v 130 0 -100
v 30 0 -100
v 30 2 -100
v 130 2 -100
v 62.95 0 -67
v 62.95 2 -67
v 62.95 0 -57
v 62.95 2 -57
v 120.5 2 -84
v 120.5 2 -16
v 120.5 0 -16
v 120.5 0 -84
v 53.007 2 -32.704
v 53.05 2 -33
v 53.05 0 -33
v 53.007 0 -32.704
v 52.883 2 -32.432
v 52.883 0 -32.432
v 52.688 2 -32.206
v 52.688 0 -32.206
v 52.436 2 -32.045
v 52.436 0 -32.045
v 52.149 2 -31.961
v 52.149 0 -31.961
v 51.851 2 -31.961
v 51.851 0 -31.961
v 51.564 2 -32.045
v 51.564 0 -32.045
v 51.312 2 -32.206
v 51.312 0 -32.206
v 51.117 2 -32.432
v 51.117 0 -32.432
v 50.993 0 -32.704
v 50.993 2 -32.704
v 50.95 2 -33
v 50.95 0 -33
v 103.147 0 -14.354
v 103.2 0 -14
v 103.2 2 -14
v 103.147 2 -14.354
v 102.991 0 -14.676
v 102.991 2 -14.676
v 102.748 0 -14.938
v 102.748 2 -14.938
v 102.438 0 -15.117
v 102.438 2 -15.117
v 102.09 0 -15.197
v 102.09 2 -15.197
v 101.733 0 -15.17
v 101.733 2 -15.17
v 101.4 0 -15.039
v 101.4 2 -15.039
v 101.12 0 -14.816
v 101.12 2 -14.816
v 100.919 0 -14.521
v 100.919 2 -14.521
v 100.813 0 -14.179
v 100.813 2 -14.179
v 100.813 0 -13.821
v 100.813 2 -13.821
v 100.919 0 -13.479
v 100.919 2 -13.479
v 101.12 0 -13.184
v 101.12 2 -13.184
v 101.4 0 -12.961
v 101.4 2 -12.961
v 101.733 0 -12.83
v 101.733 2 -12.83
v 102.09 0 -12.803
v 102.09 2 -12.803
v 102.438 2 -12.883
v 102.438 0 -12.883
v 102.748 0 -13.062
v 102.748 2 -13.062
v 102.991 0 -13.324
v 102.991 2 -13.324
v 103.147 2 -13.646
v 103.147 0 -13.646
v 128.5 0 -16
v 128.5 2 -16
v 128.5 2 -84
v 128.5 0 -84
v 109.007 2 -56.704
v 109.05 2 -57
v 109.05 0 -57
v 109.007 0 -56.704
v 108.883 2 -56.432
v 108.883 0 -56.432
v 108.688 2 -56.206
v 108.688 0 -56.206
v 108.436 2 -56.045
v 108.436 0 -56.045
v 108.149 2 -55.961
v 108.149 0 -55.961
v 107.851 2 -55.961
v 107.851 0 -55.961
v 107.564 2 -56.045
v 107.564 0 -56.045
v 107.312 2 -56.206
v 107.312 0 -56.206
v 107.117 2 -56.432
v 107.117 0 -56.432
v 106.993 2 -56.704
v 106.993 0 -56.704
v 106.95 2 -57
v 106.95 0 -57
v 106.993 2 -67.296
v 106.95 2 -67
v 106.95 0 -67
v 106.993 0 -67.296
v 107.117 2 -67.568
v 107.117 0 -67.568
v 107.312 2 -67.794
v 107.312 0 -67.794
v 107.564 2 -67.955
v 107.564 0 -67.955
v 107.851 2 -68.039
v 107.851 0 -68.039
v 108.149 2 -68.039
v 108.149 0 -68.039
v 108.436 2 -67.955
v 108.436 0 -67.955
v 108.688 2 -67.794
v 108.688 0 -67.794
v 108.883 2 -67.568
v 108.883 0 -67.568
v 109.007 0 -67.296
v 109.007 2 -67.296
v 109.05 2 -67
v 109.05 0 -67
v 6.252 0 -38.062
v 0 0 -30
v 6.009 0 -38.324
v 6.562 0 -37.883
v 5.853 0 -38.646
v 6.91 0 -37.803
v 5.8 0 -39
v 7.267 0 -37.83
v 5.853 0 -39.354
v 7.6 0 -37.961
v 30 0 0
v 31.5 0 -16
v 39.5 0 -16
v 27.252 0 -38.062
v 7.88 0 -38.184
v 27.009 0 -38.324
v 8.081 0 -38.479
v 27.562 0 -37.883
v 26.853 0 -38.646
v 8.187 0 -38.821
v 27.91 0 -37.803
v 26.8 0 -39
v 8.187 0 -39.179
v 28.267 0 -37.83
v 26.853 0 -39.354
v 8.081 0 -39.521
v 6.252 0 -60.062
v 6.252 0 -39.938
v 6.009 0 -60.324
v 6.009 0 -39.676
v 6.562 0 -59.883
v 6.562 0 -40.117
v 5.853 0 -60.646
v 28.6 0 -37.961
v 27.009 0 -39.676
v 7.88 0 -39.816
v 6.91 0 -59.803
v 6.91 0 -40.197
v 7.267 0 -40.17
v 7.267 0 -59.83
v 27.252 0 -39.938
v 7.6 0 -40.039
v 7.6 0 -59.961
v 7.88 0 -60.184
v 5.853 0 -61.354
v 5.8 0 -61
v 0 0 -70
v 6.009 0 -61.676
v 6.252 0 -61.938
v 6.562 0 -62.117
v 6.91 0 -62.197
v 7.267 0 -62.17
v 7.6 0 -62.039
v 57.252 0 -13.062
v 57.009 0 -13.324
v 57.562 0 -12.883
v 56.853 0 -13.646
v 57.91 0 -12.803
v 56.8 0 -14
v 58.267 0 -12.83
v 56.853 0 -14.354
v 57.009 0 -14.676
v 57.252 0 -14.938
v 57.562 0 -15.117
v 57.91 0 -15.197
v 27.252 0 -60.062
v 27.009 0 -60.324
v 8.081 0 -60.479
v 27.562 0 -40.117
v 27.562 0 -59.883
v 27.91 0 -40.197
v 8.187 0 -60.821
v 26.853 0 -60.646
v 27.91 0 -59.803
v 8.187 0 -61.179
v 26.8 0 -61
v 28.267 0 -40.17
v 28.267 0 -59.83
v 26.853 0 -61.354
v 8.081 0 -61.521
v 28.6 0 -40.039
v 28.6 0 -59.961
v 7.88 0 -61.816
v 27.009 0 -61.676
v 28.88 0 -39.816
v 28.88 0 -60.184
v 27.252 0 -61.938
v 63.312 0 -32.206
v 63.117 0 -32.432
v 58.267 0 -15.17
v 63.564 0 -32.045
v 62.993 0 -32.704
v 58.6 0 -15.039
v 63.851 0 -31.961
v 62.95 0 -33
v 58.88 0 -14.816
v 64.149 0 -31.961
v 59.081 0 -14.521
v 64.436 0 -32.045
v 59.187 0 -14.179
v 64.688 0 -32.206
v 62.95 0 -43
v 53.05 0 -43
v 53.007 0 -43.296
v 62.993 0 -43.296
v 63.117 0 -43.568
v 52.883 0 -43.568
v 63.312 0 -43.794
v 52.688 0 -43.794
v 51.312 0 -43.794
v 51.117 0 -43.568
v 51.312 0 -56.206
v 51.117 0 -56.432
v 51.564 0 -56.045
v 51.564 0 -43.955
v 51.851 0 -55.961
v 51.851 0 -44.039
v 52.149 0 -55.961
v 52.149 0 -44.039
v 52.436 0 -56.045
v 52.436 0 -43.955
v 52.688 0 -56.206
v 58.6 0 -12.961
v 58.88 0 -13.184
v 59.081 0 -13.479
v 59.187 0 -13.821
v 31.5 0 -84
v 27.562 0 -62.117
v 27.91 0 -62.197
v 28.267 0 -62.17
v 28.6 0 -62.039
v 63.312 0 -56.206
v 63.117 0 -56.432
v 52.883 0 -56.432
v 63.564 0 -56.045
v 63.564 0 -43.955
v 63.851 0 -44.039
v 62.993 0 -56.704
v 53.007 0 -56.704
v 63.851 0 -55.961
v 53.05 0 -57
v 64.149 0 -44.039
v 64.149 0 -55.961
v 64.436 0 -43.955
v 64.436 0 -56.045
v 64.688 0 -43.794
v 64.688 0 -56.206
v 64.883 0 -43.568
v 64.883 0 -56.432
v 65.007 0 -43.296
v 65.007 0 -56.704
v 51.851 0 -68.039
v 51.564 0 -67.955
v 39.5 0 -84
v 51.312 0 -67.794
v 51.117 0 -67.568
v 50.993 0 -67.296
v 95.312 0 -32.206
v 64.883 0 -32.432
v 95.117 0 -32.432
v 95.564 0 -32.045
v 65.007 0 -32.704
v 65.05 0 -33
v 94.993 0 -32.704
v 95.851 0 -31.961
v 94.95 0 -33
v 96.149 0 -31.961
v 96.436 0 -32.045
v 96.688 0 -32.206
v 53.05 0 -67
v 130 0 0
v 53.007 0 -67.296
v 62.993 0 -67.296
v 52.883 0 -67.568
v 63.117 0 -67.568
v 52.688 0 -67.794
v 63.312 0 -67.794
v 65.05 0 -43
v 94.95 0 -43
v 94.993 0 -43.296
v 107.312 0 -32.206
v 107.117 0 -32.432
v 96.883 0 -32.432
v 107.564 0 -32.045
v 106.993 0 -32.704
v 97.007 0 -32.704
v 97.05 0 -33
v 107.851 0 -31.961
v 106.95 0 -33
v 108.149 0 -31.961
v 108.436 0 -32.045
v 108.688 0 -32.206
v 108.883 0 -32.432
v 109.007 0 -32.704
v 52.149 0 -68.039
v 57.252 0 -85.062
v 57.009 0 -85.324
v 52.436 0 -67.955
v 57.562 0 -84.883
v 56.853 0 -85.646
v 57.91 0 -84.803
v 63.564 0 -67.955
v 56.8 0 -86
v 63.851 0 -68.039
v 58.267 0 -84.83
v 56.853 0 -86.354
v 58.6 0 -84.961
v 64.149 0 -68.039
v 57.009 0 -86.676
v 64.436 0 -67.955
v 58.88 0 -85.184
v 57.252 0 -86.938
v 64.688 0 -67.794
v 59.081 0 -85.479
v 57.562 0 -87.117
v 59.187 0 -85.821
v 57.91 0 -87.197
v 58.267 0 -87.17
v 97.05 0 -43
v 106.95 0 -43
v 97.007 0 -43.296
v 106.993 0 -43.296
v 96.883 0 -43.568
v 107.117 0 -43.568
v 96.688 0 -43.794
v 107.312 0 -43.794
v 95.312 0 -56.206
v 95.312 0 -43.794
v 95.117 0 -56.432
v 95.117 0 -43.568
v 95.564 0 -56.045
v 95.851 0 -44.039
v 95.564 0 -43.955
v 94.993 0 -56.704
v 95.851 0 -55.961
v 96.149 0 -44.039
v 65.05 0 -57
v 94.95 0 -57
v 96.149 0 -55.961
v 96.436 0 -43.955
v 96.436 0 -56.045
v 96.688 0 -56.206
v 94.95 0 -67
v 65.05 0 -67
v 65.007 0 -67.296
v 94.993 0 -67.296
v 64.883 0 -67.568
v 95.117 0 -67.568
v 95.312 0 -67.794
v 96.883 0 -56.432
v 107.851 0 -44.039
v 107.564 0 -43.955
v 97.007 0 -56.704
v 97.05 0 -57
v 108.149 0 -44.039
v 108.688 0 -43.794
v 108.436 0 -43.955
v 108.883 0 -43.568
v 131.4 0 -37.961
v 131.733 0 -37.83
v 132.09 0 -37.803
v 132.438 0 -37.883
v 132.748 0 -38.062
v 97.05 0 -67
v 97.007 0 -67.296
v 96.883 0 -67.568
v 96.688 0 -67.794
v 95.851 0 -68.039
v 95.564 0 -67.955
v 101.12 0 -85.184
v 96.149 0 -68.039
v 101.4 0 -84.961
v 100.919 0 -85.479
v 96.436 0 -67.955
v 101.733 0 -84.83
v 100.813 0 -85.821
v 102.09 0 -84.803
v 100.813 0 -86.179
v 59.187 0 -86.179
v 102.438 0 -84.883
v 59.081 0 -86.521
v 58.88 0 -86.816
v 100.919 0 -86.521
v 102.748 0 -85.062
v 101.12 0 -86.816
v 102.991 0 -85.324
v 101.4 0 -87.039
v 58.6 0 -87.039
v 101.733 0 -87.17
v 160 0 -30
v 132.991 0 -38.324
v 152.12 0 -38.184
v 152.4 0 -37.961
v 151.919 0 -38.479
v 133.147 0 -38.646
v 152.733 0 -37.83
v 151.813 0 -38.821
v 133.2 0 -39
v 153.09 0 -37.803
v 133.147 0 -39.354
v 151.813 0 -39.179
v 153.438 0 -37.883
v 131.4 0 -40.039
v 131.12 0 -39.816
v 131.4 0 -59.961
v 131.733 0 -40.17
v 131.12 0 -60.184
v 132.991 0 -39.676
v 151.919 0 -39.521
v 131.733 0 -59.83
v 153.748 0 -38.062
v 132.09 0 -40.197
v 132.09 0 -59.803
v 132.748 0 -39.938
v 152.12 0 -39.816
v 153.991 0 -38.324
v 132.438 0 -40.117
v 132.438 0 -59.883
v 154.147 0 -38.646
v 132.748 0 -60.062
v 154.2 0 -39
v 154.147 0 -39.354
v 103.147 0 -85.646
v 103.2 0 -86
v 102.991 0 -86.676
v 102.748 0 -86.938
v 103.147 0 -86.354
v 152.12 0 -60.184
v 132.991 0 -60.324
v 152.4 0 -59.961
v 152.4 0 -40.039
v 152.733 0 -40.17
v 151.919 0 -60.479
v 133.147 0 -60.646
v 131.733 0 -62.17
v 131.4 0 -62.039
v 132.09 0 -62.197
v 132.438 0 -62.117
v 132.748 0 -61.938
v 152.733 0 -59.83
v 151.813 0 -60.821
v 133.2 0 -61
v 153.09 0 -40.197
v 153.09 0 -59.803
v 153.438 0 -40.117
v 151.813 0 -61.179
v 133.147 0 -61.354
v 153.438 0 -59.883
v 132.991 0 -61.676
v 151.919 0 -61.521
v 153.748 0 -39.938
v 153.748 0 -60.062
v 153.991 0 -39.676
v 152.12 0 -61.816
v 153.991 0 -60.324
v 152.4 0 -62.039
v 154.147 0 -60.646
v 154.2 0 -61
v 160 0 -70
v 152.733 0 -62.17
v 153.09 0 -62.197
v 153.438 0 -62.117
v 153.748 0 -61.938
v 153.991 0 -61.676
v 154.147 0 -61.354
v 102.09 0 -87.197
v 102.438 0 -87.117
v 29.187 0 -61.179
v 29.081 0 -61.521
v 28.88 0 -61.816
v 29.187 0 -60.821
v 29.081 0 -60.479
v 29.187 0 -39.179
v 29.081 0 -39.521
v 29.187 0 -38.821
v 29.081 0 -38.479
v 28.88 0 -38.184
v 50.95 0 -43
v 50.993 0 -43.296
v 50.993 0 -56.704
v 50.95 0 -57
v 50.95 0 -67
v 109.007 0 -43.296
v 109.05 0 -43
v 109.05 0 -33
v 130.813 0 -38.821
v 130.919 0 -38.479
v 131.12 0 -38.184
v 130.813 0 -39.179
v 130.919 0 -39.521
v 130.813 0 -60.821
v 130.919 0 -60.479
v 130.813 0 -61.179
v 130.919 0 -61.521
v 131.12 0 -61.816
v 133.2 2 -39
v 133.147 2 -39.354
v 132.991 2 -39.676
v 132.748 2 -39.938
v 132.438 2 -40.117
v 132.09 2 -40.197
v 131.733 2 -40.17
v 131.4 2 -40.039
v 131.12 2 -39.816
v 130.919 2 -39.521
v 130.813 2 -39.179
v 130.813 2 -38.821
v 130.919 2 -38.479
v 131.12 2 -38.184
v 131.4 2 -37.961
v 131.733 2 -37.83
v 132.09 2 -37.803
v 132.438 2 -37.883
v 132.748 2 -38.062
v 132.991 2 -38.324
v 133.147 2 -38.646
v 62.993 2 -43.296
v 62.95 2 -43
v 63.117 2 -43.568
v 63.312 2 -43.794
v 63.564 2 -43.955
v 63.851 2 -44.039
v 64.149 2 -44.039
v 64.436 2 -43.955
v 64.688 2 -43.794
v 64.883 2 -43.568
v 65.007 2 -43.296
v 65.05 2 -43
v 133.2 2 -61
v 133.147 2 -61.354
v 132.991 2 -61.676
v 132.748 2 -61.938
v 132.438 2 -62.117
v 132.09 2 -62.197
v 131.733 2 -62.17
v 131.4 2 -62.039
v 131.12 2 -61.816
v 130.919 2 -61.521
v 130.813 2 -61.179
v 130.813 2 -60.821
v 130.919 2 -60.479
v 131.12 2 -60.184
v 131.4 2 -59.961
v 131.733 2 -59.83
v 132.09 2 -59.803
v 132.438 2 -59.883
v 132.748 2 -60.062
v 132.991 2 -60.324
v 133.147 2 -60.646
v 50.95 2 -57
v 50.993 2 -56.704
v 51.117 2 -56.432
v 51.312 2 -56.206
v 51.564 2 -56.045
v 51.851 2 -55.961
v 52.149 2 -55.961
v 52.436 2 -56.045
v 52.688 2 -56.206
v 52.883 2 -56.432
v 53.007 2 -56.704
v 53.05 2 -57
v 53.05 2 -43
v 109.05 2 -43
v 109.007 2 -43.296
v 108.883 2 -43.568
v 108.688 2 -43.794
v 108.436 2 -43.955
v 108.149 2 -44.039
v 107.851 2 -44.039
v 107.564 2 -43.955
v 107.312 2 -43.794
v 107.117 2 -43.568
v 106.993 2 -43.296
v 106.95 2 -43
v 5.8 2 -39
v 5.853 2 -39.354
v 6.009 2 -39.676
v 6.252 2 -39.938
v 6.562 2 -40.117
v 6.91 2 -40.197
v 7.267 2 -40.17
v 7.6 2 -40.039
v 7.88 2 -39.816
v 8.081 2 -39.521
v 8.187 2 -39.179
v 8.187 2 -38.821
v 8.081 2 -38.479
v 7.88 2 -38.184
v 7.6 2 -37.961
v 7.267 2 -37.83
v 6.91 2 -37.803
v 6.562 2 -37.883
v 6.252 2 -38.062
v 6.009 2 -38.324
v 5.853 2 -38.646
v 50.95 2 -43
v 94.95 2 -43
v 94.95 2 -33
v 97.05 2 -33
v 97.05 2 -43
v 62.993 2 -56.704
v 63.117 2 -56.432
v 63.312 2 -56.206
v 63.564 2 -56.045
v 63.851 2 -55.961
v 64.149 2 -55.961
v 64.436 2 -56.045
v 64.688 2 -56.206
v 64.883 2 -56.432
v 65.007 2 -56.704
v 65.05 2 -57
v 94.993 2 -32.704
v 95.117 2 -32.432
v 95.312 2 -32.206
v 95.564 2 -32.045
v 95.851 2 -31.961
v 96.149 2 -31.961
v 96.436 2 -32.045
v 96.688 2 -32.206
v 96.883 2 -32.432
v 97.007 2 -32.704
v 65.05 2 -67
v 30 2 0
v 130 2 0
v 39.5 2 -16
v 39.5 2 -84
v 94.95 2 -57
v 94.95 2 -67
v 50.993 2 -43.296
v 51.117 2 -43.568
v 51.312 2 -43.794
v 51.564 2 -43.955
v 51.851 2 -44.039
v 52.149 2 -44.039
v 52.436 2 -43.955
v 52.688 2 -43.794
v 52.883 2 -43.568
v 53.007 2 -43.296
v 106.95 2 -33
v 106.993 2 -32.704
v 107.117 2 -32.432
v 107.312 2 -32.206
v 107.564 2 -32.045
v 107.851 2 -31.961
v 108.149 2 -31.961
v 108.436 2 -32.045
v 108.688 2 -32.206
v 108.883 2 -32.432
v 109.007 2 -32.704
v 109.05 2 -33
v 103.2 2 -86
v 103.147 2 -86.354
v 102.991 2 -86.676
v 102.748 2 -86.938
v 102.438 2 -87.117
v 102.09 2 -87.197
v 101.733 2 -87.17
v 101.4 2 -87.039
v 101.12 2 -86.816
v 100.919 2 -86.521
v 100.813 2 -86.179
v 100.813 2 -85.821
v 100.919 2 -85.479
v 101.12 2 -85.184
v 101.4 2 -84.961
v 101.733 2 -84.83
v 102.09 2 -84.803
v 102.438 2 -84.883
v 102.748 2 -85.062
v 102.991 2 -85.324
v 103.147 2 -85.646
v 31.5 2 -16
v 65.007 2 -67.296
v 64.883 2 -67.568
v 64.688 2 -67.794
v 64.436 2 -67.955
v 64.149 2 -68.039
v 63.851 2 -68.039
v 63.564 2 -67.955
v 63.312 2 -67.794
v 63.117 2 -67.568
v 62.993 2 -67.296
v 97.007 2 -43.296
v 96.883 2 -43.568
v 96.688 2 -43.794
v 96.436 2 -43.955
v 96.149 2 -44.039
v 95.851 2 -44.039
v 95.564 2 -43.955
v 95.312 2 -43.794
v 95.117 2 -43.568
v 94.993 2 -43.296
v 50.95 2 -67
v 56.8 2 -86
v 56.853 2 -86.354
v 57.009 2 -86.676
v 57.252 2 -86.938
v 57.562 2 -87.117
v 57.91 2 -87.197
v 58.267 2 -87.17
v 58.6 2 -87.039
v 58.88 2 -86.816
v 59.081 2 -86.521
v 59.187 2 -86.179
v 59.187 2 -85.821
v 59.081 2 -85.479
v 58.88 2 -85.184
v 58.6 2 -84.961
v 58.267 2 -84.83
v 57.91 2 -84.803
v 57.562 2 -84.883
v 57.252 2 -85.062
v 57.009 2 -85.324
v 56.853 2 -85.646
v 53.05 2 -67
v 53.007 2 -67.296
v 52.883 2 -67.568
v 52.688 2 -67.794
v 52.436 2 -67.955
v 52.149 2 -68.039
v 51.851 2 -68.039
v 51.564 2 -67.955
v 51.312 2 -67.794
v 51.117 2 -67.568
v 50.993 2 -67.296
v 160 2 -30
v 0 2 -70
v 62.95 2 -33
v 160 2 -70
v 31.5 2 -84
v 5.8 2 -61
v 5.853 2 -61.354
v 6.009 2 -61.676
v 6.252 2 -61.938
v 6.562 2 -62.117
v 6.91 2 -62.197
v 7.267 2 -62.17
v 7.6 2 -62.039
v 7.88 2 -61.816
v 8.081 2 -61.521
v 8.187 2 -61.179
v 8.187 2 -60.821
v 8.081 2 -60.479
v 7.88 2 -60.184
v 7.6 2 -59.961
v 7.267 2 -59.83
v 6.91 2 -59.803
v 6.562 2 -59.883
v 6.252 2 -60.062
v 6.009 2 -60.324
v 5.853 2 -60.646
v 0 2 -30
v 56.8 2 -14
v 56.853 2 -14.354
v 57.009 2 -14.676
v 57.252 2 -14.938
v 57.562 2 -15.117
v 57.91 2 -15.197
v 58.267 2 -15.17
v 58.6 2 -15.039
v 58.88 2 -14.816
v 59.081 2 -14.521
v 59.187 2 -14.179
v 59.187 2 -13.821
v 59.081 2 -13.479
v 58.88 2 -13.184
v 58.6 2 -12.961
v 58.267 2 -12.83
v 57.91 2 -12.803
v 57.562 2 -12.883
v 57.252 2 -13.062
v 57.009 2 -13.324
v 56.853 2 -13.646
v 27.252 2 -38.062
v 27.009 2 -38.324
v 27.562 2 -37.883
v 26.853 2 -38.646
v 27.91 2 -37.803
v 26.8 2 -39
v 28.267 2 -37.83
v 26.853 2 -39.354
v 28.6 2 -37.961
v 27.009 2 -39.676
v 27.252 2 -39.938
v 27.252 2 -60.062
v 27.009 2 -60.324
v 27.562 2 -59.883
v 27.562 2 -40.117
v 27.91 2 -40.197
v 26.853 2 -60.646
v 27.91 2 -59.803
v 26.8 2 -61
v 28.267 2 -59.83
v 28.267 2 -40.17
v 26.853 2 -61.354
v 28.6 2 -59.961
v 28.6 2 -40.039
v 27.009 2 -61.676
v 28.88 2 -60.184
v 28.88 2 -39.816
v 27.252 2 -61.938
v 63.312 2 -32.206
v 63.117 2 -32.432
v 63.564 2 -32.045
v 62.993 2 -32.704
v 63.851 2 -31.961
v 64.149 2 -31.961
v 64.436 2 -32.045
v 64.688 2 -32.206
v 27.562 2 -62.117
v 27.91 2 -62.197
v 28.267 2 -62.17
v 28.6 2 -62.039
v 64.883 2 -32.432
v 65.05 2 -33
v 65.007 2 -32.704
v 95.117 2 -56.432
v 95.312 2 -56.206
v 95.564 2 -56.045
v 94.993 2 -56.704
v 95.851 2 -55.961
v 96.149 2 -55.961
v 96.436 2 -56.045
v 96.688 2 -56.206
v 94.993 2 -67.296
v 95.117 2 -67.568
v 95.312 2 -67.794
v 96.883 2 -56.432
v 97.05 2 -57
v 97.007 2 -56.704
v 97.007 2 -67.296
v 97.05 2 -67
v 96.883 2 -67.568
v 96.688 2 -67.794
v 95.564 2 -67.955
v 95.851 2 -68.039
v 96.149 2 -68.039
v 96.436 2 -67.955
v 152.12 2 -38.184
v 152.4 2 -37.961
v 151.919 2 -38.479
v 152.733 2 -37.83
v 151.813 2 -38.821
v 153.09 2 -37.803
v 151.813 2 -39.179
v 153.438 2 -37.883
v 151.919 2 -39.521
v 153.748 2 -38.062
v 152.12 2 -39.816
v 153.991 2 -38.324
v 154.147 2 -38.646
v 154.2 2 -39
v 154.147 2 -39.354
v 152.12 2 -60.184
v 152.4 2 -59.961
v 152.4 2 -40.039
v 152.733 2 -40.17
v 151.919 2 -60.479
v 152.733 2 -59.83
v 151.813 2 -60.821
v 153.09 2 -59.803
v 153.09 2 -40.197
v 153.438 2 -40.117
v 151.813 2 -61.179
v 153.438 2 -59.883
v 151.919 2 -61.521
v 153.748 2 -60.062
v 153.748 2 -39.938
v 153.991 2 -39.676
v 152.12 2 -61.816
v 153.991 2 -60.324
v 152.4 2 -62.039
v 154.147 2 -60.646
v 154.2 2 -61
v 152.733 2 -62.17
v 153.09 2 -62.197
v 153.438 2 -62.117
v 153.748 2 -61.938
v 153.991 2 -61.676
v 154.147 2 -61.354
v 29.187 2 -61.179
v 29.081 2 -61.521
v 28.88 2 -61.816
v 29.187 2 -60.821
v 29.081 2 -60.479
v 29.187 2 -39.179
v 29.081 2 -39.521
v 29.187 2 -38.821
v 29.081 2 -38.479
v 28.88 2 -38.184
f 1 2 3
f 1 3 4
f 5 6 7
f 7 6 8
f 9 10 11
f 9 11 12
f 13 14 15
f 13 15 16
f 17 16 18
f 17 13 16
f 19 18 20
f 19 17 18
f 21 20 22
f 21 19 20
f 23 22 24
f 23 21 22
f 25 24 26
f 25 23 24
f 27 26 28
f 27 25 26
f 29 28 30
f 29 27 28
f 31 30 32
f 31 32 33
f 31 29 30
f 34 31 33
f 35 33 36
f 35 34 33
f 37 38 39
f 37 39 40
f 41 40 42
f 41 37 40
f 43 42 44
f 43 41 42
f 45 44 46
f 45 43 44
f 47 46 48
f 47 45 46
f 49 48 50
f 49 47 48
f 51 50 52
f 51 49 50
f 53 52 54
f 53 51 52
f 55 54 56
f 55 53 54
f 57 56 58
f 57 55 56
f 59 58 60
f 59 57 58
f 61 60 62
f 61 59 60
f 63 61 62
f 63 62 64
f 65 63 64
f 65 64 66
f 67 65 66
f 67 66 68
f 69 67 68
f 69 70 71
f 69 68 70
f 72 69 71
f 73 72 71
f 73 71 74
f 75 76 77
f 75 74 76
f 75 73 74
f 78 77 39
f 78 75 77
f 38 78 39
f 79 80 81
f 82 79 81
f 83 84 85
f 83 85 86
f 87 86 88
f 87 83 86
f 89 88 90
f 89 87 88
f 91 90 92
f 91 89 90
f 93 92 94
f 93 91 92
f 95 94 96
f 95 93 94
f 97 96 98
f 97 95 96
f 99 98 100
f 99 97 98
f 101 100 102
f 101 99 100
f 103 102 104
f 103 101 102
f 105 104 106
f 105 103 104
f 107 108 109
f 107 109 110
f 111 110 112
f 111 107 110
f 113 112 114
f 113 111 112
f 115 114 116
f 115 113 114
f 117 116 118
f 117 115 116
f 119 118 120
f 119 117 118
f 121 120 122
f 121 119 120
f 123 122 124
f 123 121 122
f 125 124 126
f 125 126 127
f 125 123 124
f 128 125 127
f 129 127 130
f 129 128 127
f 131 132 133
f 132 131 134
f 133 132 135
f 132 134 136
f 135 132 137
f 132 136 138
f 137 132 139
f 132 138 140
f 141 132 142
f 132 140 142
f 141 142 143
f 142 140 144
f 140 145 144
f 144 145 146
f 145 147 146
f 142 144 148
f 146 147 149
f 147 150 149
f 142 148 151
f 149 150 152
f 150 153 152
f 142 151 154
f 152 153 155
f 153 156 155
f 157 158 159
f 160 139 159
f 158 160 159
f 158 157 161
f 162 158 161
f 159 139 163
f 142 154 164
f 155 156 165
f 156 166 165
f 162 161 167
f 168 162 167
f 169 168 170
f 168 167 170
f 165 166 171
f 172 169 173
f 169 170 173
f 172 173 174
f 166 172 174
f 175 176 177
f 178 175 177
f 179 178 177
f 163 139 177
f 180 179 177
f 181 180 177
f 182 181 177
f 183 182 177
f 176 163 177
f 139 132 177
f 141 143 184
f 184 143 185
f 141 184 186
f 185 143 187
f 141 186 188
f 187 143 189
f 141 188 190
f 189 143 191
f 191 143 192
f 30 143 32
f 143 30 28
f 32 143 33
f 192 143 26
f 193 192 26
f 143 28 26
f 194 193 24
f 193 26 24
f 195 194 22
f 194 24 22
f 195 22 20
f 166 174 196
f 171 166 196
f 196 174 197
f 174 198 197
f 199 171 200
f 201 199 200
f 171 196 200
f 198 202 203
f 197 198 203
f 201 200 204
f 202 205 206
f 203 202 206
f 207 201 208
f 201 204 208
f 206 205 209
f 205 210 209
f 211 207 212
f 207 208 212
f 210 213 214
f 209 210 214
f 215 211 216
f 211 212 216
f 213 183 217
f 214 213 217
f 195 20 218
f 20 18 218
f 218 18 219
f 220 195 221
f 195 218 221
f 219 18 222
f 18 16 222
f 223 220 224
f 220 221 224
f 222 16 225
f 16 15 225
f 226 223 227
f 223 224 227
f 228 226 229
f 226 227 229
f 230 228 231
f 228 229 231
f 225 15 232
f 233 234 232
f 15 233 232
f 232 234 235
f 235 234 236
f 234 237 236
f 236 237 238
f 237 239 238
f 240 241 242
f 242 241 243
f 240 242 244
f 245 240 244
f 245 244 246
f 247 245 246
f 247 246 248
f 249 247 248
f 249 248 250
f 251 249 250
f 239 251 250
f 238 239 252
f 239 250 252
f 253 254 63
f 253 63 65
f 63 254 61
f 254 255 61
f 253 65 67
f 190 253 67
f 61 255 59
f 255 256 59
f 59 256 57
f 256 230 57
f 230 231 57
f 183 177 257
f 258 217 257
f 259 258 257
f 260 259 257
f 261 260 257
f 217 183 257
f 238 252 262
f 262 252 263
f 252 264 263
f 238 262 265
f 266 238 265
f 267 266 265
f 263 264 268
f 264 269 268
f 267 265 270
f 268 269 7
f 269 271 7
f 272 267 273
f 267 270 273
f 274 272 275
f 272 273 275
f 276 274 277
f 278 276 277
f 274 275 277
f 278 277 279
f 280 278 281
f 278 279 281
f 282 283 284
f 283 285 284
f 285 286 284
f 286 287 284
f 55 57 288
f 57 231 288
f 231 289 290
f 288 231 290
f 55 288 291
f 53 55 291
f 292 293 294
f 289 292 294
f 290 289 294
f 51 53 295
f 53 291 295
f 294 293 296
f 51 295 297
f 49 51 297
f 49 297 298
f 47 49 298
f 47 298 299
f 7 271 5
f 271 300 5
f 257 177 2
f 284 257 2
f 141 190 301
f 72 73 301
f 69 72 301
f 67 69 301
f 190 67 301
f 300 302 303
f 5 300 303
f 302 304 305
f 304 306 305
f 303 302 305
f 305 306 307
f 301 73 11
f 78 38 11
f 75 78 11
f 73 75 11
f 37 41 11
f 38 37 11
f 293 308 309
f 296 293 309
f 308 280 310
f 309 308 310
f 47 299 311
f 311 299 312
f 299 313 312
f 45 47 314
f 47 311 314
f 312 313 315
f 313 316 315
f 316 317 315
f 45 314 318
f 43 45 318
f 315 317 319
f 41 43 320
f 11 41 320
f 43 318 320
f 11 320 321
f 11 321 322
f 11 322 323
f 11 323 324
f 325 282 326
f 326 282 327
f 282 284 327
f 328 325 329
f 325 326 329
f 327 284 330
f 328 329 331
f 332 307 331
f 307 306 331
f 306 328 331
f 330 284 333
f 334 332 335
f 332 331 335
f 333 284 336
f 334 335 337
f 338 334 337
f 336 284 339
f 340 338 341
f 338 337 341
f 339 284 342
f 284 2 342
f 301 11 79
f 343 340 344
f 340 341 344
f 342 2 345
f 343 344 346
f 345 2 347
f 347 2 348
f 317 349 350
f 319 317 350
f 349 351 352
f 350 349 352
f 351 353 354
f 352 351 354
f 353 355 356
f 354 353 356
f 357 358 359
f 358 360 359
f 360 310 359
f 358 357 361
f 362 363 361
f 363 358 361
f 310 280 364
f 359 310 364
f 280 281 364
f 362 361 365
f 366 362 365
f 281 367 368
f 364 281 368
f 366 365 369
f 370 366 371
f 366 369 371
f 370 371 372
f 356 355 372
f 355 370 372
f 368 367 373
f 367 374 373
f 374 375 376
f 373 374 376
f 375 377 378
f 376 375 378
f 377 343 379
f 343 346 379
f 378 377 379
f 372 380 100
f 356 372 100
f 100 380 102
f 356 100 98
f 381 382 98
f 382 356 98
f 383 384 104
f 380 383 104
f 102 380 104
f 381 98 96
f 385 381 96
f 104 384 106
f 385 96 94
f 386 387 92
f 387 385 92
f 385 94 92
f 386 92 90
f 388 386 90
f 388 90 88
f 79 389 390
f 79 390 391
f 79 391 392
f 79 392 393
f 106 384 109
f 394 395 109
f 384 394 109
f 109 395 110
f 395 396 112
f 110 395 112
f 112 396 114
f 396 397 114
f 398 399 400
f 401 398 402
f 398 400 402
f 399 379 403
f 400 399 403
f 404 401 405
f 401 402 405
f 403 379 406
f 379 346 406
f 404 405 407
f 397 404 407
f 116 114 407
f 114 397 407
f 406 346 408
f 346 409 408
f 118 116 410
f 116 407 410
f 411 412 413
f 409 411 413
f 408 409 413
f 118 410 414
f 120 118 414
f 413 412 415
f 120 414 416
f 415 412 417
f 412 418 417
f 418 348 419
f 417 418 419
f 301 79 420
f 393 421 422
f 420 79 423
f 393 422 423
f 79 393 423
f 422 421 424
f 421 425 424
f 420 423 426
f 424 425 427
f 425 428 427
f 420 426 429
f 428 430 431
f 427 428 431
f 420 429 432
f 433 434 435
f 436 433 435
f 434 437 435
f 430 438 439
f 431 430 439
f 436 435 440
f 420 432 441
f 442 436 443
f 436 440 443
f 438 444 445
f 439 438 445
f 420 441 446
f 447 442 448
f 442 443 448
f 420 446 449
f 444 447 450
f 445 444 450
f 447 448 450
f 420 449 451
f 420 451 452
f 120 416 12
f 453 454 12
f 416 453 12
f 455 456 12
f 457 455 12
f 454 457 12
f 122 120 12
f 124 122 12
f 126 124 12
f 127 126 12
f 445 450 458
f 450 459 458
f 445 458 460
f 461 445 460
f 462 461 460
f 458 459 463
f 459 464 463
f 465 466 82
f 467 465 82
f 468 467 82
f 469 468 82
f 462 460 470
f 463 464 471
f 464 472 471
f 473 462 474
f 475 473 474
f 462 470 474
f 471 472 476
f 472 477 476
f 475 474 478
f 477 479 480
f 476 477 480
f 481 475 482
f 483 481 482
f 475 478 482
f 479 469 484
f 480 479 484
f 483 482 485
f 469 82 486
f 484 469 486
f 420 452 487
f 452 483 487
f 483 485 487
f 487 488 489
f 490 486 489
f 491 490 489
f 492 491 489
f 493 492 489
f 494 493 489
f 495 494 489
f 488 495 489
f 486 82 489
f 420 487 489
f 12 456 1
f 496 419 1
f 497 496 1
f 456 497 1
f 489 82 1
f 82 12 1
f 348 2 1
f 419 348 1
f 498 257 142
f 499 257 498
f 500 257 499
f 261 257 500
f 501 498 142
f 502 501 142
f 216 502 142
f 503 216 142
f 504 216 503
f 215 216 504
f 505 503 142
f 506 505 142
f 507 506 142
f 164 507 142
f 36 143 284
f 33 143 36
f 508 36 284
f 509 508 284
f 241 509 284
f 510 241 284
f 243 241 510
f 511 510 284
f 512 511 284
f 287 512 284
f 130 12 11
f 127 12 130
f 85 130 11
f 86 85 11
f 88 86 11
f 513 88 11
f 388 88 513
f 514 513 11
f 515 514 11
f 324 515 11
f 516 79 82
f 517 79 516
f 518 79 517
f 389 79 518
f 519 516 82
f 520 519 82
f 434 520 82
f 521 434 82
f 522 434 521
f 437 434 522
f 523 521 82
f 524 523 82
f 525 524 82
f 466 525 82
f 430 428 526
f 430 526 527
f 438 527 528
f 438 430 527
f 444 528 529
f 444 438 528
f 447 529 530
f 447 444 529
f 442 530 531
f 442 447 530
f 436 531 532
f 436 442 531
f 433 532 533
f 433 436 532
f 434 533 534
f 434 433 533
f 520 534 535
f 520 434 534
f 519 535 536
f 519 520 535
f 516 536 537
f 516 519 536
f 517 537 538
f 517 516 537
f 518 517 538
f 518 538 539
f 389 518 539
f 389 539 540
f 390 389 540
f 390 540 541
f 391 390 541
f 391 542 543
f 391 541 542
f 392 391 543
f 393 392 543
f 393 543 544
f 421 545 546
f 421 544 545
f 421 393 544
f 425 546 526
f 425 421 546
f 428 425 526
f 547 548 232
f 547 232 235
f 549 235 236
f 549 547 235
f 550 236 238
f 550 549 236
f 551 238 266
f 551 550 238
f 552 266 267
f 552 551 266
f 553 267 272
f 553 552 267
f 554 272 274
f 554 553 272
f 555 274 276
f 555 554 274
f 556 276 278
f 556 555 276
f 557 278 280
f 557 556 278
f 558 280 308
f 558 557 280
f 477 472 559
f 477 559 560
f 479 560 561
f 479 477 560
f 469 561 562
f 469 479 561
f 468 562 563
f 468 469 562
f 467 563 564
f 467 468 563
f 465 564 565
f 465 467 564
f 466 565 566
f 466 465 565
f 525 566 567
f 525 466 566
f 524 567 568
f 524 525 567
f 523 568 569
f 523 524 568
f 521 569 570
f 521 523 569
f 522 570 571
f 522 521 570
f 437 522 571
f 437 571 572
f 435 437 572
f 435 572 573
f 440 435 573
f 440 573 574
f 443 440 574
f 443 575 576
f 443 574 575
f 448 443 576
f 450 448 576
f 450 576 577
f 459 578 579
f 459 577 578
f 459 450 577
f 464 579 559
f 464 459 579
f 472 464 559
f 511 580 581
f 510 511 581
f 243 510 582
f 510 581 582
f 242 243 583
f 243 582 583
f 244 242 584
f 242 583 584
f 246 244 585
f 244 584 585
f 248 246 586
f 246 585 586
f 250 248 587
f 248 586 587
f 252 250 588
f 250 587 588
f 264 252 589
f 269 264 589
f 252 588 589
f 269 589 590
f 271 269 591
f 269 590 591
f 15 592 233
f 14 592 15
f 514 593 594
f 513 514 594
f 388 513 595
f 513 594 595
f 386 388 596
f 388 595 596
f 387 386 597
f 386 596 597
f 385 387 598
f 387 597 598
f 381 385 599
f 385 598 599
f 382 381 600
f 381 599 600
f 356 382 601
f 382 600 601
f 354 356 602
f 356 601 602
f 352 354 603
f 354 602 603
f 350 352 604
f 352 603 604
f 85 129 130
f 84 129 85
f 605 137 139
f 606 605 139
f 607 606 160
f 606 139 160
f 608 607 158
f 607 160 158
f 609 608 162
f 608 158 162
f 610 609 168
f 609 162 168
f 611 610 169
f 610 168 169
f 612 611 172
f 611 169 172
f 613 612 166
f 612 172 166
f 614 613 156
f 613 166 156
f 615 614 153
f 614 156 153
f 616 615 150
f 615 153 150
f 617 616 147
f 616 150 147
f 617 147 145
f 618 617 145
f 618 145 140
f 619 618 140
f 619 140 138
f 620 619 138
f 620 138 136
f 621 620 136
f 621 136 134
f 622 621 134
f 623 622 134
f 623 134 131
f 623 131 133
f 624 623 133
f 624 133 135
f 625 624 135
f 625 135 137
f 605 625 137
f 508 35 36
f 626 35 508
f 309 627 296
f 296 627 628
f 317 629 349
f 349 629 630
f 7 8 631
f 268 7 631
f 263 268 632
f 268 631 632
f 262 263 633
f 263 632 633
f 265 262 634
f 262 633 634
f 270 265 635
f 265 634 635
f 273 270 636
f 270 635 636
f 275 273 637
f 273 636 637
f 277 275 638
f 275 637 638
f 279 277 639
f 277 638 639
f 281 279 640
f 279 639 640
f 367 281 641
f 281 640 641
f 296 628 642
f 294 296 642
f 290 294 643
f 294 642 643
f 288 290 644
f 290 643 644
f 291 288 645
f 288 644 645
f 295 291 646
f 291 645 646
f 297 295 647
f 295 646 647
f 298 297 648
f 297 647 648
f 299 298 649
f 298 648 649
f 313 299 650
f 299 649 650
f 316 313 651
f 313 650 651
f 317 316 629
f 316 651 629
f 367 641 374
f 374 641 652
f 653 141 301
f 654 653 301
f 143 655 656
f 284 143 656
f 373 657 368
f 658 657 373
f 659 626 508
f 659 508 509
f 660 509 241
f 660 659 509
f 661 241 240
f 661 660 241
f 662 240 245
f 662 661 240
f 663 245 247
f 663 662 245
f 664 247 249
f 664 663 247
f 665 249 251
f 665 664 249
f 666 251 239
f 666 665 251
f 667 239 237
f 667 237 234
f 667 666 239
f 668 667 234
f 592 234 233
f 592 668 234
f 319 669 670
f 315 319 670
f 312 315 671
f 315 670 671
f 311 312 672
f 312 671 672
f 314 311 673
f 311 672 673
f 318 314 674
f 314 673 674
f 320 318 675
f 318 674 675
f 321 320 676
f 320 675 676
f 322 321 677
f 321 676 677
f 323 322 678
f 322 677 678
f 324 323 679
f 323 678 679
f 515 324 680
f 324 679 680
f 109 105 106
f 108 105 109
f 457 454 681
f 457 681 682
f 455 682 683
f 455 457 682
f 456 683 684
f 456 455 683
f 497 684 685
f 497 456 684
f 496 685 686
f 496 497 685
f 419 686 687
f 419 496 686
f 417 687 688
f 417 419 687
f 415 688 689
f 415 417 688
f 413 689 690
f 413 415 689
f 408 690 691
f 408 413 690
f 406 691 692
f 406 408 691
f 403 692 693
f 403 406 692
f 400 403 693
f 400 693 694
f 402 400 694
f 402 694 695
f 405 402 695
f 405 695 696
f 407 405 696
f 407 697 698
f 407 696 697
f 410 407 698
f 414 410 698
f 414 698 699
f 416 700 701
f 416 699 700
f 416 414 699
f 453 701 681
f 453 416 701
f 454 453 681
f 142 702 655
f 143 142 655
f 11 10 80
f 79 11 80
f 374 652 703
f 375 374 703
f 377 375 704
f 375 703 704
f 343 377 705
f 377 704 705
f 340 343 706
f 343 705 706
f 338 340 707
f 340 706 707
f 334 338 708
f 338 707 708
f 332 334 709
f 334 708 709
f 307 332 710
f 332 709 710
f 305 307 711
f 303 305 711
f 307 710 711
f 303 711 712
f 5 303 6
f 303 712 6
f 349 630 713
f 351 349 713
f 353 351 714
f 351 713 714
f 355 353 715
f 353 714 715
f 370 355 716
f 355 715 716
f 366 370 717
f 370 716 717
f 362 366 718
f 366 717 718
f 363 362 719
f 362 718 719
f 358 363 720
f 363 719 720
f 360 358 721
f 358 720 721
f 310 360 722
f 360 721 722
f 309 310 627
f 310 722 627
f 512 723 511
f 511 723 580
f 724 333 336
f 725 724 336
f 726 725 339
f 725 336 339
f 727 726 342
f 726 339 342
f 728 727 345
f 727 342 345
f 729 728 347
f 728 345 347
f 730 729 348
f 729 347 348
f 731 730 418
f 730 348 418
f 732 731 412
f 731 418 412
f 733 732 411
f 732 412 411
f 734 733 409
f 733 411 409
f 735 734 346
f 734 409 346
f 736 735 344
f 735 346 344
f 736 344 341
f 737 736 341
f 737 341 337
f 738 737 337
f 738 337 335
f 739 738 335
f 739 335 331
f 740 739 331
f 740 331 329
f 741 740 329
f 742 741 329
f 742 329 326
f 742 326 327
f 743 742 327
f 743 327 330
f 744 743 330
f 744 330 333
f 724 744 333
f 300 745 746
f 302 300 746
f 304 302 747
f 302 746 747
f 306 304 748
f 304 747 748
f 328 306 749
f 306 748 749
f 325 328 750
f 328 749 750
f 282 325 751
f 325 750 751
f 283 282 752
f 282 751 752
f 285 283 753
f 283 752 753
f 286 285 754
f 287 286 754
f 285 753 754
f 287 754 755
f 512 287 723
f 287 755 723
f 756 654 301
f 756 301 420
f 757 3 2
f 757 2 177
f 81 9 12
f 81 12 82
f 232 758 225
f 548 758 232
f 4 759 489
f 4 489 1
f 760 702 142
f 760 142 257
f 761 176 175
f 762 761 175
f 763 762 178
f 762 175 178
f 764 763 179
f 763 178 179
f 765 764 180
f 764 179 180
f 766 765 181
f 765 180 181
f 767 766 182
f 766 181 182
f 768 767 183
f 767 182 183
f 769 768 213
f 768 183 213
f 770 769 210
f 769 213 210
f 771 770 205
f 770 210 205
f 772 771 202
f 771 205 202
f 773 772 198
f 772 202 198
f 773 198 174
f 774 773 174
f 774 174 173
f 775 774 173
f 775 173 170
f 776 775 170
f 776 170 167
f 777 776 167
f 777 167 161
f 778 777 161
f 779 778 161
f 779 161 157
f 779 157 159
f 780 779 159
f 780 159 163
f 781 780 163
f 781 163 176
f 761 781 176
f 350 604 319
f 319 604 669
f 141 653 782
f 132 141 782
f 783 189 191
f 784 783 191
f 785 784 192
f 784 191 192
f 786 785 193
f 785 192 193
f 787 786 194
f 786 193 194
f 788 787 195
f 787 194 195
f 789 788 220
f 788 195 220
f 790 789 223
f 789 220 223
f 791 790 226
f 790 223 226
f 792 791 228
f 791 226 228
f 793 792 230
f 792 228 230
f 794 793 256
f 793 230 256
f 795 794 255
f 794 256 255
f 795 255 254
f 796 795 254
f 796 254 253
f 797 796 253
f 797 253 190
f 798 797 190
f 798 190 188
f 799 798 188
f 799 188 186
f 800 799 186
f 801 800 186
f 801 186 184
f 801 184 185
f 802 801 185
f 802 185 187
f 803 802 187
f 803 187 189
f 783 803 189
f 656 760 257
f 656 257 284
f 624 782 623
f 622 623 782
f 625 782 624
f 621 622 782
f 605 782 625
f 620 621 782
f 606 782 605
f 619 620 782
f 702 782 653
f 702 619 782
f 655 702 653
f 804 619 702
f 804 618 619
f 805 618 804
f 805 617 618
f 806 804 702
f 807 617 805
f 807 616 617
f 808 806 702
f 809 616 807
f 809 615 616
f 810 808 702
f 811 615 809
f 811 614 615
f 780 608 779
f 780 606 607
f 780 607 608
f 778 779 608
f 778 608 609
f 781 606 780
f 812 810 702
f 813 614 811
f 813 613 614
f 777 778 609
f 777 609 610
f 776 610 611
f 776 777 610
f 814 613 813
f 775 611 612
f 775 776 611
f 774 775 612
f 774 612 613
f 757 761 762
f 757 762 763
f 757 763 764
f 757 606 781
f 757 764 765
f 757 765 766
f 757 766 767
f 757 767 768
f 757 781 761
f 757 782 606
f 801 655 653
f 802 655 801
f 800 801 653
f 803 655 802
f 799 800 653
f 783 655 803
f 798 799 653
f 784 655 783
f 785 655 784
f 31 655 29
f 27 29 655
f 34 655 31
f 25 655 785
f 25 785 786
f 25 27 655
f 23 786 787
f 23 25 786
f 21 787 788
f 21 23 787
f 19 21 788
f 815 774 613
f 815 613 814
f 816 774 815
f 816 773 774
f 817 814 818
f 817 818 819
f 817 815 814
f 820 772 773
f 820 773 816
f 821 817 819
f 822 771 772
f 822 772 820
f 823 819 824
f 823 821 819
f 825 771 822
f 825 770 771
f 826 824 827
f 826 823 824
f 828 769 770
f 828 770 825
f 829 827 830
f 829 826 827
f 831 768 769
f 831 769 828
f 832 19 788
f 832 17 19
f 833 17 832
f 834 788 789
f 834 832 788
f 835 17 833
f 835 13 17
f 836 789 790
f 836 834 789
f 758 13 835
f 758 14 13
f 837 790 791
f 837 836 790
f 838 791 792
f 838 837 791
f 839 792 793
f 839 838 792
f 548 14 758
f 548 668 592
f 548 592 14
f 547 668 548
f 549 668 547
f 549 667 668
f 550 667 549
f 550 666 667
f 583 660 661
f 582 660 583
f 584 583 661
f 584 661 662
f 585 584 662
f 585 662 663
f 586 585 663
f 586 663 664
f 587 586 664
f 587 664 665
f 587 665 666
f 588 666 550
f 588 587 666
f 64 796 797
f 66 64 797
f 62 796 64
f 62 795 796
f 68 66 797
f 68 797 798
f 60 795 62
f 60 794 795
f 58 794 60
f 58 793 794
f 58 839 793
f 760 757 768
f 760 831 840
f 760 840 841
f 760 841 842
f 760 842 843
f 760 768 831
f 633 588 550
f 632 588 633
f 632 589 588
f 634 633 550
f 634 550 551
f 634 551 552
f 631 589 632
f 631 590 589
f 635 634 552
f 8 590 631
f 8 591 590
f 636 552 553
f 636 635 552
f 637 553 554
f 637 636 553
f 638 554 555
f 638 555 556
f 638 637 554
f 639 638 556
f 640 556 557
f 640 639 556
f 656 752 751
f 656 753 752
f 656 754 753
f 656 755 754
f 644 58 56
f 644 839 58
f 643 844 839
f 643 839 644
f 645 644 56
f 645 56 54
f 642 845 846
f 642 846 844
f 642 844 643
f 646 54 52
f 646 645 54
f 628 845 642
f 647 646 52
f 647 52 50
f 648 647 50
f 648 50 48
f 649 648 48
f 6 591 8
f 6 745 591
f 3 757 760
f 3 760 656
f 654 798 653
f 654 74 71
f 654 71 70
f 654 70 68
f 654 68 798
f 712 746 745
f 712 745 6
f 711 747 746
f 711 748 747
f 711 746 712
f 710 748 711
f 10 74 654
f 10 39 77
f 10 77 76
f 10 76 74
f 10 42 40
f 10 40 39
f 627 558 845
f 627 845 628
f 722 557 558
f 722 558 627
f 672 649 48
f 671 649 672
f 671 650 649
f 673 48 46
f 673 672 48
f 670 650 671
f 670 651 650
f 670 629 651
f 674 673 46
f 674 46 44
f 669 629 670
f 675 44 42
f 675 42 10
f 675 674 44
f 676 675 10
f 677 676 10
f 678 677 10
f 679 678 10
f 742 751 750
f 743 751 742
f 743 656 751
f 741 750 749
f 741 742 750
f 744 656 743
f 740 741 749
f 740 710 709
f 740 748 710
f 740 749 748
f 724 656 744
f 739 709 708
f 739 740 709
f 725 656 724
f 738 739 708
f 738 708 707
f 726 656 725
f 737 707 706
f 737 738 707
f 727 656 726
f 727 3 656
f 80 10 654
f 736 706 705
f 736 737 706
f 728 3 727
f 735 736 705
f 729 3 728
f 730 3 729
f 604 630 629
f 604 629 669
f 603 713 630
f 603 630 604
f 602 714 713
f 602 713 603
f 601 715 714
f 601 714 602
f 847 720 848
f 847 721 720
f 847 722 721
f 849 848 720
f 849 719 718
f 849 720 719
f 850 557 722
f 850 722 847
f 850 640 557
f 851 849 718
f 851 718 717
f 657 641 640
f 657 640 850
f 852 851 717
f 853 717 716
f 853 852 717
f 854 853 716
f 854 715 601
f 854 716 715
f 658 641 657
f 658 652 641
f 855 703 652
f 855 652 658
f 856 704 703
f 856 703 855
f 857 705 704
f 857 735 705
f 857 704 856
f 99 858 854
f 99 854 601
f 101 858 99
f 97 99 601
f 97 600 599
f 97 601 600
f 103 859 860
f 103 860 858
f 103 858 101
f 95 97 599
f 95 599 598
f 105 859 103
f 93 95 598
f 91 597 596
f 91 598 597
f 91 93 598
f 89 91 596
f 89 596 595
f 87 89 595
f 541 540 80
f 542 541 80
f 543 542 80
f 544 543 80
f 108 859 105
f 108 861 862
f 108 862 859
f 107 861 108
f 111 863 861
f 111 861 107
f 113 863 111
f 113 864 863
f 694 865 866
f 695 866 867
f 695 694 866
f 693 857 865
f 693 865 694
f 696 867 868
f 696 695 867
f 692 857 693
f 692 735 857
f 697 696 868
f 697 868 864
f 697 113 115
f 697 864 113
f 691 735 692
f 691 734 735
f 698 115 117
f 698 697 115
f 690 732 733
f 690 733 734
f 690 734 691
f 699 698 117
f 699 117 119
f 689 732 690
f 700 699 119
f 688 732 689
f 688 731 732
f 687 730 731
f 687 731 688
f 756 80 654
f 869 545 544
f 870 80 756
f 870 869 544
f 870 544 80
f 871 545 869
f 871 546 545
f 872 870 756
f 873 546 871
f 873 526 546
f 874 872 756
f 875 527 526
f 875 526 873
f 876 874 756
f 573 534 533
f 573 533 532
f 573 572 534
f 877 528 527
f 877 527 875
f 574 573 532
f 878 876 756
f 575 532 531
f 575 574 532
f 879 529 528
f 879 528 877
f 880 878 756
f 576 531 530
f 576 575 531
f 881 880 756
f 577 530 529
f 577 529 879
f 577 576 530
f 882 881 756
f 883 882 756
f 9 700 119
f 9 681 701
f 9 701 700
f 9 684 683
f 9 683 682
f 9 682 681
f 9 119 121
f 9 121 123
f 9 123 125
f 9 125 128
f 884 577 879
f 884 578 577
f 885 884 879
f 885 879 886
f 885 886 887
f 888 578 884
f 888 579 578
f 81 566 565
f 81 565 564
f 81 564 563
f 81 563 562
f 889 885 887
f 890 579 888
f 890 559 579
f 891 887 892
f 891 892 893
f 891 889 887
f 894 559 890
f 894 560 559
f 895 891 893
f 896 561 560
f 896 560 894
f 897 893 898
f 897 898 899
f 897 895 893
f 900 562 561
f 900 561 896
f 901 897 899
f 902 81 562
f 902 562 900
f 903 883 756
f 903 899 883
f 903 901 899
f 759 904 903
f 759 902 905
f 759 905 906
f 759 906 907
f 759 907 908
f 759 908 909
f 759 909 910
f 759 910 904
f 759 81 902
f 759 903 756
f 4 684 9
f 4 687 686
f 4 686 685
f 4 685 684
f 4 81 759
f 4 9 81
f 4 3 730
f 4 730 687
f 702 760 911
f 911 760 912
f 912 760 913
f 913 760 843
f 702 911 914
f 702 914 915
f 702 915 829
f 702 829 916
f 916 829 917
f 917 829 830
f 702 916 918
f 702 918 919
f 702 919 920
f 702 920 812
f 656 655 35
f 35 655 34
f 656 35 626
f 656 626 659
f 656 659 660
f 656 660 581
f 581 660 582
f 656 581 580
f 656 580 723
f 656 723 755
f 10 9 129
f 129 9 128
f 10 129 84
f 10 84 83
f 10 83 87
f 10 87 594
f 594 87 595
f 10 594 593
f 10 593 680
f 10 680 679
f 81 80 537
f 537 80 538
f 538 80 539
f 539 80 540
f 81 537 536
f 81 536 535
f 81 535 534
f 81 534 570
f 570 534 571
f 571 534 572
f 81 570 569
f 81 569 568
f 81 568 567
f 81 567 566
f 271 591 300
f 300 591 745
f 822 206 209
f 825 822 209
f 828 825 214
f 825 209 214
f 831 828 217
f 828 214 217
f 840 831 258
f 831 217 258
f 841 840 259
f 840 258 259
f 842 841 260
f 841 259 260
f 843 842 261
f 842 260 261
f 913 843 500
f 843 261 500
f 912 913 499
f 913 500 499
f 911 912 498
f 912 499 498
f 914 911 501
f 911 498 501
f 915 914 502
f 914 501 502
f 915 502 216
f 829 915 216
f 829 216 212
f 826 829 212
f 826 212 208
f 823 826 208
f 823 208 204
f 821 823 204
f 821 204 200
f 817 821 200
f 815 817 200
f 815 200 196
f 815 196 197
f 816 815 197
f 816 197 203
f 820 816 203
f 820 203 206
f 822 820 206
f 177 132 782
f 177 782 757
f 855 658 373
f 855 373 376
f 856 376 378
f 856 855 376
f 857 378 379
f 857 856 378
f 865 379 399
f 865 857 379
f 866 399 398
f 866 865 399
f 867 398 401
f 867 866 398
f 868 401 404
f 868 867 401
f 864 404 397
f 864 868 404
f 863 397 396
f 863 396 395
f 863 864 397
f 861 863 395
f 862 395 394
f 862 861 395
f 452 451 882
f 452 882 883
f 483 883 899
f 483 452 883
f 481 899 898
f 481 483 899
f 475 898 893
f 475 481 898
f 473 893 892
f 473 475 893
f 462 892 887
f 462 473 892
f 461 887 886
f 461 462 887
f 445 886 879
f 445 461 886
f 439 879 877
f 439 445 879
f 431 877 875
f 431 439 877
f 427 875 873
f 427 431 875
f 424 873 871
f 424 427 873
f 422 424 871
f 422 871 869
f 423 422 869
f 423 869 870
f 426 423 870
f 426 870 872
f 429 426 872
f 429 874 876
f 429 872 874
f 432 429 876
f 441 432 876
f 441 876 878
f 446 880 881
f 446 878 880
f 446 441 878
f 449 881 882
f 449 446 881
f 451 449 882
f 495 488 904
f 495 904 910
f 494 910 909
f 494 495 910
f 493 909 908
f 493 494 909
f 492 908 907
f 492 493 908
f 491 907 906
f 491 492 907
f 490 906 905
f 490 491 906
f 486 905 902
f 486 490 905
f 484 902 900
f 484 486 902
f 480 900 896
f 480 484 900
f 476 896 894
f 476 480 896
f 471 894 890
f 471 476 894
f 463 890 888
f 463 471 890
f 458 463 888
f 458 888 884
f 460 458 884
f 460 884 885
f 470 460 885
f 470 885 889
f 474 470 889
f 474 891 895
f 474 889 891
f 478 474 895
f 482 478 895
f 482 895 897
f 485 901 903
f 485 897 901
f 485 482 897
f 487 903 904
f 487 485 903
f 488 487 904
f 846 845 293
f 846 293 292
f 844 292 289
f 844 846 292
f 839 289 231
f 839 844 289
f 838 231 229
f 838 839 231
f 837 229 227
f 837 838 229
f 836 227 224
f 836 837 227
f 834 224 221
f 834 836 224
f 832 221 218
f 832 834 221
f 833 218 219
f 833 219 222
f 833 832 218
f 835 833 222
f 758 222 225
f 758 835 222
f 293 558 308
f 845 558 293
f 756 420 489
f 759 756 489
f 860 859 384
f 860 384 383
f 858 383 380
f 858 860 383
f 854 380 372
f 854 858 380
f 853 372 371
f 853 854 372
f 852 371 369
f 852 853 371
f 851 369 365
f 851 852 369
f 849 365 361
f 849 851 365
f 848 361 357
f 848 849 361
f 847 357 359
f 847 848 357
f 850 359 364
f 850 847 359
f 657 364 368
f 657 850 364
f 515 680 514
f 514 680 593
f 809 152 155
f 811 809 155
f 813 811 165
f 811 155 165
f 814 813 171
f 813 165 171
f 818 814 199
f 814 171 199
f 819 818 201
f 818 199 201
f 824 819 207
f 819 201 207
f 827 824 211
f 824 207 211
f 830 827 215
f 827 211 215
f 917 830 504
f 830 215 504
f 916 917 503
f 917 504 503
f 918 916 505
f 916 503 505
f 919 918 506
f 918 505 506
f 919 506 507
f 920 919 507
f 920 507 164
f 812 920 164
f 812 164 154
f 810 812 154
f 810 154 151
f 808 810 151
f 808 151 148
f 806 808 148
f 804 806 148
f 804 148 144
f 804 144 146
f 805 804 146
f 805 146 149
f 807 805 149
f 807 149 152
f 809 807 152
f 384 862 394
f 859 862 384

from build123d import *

# Parameters (mm, degrees)
ESQUISSE1_W                         = 160
ESQUISSE1_H                         = 100
BOSS_EXTRU_1_DEPTH                  = 2
ENL_V_MAT_EXTRU_1_DEPTH             = 2
ENL_V_MAT_EXTRU_2_DEPTH             = 2
D_GAGEMENT_M21_D                    = 2.4
D_GAGEMENT_M21_DEPTH                = 2.001
D_GAGEMENT_M22_D                    = 2.4
D_GAGEMENT_M22_DEPTH                = 2.001
ENL_V_MAT_EXTRU_5_REACH             = 4
ESQUISSE11_W                        = 8
ESQUISSE11_H                        = 68
ENL_V_MAT_EXTRU_5_DIRECTION_2_DEPTH = 1


with BuildPart() as part:
    # Esquisse1 → Boss.-Extru.1 (new body)
    with BuildSketch(Plane(origin=(0, 0, 0), x_dir=(1, 0, 0), z_dir=(0, 1, 0))):
        with Locations((80, 50)):
            Rectangle(ESQUISSE1_W, ESQUISSE1_H)
    extrude(amount=BOSS_EXTRU_1_DEPTH)

    # Esquisse2 → Enlèv. mat.-Extru.1 (cut)
    with BuildSketch(Plane(origin=(0, 2, 0), x_dir=(1, 0, 0), z_dir=(0, 1, 0))):
        Polygon((30, 0), (0, 30), (0, 0), align=None)
        Polygon((30, 100), (0, 70), (0, 100), align=None)
        Polygon((130, 0), (160, 30), (160, 0), align=None)
        Polygon((130, 100), (160, 100), (160, 70), align=None)
    extrude(amount=-ENL_V_MAT_EXTRU_1_DEPTH, mode=Mode.SUBTRACT)

    # Esquisse3 → Enlèv. mat.-Extru.2 (cut)
    with BuildSketch(Plane(origin=(0, 2, 0), x_dir=(1, 0, 0), z_dir=(0, 1, 0))):
        with BuildLine():
            Line((65.05, 43), (65.05, 33))
            ThreePointArc((65.05, 33), (64, 31.95), (62.95, 33))
            Line((62.95, 33), (62.95, 43))
            ThreePointArc((62.95, 43), (64, 44.05), (65.05, 43))
        make_face()
        with BuildLine():
            Line((50.95, 33), (50.95, 43))
            ThreePointArc((50.95, 43), (52, 44.05), (53.05, 43))
            Line((53.05, 43), (53.05, 33))
            ThreePointArc((53.05, 33), (52, 31.95), (50.95, 33))
        make_face()
        with BuildLine():
            Line((109.05, 33), (109.05, 43))
            ThreePointArc((109.05, 43), (108, 44.05), (106.95, 43))
            Line((106.95, 43), (106.95, 33))
            ThreePointArc((106.95, 33), (108, 31.95), (109.05, 33))
        make_face()
        with BuildLine():
            Line((94.95, 43), (94.95, 33))
            ThreePointArc((94.95, 33), (96, 31.95), (97.05, 33))
            Line((97.05, 33), (97.05, 43))
            ThreePointArc((97.05, 43), (96, 44.05), (94.95, 43))
        make_face()
        with BuildLine():
            Line((50.95, 67), (50.95, 57))
            ThreePointArc((50.95, 57), (52, 55.95), (53.05, 57))
            Line((53.05, 57), (53.05, 67))
            ThreePointArc((53.05, 67), (52, 68.05), (50.95, 67))
        make_face()
        with BuildLine():
            Line((65.05, 57), (65.05, 67))
            ThreePointArc((65.05, 67), (64, 68.05), (62.95, 67))
            Line((62.95, 67), (62.95, 57))
            ThreePointArc((62.95, 57), (64, 55.95), (65.05, 57))
        make_face()
        with BuildLine():
            Line((94.95, 57), (94.95, 67))
            ThreePointArc((94.95, 67), (96, 68.05), (97.05, 67))
            Line((97.05, 67), (97.05, 57))
            ThreePointArc((97.05, 57), (96, 55.95), (94.95, 57))
        make_face()
        with BuildLine():
            Line((109.05, 67), (109.05, 57))
            ThreePointArc((109.05, 57), (108, 55.95), (106.95, 57))
            Line((106.95, 57), (106.95, 67))
            ThreePointArc((106.95, 67), (108, 68.05), (109.05, 67))
        make_face()
    extrude(amount=-ENL_V_MAT_EXTRU_2_DEPTH, mode=Mode.SUBTRACT)

    # Dégagement M21
    with Locations(Plane(origin=(0, 2, 0), x_dir=(1, 0, 0), z_dir=(0, 1, 0))):
        with Locations((28, 39), (28, 61), (7, 61), (7, 39)):
            d_gagement_m21 = Hole(D_GAGEMENT_M21_D / 2, depth=D_GAGEMENT_M21_DEPTH)

    # Dégagement M22
    with Locations(Plane(origin=(0, 2, 0), x_dir=(1, 0, 0), z_dir=(0, 1, 0))):
        with Locations((58, 14), (58, 86)):
            d_gagement_m22 = Hole(D_GAGEMENT_M22_D / 2, depth=D_GAGEMENT_M22_DEPTH)

    # Symétrie1: Dégagement M21, Dégagement M22 across plane
    add(d_gagement_m21.mirror(Plane.ZY.offset(-80)), mode=Mode.SUBTRACT)
    add(d_gagement_m22.mirror(Plane.ZY.offset(-80)), mode=Mode.SUBTRACT)

    # Esquisse11 → Enlèv. mat.-Extru.5 (cut, up to next)
    with BuildSketch(Plane(origin=(0, 2, 0), x_dir=(1, 0, 0), z_dir=(0, 1, 0)), mode=Mode.PRIVATE) as enl_v_mat_extru_5_sk1:
        with Locations((35.5, 50)):
            Rectangle(ESQUISSE11_W, ESQUISSE11_H)
    enl_v_mat_extru_5_tool1 = extrude(enl_v_mat_extru_5_sk1.sketch, amount=-ENL_V_MAT_EXTRU_5_REACH, mode=Mode.PRIVATE) & part.part
    add(enl_v_mat_extru_5_tool1.solids().sort_by_distance((35.5, 2, -50))[0], mode=Mode.SUBTRACT)
    # Esquisse11 → Enlèv. mat.-Extru.5 (cut, up to next)
    with BuildSketch(Plane(origin=(0, 2, 0), x_dir=(1, 0, 0), z_dir=(0, 1, 0)), mode=Mode.PRIVATE) as enl_v_mat_extru_5_sk2:
        with Locations((124.5, 50)):
            Rectangle(ESQUISSE11_W, ESQUISSE11_H)
    enl_v_mat_extru_5_tool2 = extrude(enl_v_mat_extru_5_sk2.sketch, amount=-ENL_V_MAT_EXTRU_5_REACH, mode=Mode.PRIVATE) & part.part
    add(enl_v_mat_extru_5_tool2.solids().sort_by_distance((124.5, 2, -50))[0], mode=Mode.SUBTRACT)

    # Esquisse11 → Enlèv. mat.-Extru.5 direction 2 (cut)
    with BuildSketch(Plane(origin=(0, 2, 0), x_dir=(1, 0, 0), z_dir=(0, 1, 0))):
        with Locations((35.5, 50)):
            Rectangle(ESQUISSE11_W, ESQUISSE11_H)
        with Locations((124.5, 50)):
            Rectangle(ESQUISSE11_W, ESQUISSE11_H)
    extrude(amount=ENL_V_MAT_EXTRU_5_DIRECTION_2_DEPTH, mode=Mode.SUBTRACT)


solid = part.part
